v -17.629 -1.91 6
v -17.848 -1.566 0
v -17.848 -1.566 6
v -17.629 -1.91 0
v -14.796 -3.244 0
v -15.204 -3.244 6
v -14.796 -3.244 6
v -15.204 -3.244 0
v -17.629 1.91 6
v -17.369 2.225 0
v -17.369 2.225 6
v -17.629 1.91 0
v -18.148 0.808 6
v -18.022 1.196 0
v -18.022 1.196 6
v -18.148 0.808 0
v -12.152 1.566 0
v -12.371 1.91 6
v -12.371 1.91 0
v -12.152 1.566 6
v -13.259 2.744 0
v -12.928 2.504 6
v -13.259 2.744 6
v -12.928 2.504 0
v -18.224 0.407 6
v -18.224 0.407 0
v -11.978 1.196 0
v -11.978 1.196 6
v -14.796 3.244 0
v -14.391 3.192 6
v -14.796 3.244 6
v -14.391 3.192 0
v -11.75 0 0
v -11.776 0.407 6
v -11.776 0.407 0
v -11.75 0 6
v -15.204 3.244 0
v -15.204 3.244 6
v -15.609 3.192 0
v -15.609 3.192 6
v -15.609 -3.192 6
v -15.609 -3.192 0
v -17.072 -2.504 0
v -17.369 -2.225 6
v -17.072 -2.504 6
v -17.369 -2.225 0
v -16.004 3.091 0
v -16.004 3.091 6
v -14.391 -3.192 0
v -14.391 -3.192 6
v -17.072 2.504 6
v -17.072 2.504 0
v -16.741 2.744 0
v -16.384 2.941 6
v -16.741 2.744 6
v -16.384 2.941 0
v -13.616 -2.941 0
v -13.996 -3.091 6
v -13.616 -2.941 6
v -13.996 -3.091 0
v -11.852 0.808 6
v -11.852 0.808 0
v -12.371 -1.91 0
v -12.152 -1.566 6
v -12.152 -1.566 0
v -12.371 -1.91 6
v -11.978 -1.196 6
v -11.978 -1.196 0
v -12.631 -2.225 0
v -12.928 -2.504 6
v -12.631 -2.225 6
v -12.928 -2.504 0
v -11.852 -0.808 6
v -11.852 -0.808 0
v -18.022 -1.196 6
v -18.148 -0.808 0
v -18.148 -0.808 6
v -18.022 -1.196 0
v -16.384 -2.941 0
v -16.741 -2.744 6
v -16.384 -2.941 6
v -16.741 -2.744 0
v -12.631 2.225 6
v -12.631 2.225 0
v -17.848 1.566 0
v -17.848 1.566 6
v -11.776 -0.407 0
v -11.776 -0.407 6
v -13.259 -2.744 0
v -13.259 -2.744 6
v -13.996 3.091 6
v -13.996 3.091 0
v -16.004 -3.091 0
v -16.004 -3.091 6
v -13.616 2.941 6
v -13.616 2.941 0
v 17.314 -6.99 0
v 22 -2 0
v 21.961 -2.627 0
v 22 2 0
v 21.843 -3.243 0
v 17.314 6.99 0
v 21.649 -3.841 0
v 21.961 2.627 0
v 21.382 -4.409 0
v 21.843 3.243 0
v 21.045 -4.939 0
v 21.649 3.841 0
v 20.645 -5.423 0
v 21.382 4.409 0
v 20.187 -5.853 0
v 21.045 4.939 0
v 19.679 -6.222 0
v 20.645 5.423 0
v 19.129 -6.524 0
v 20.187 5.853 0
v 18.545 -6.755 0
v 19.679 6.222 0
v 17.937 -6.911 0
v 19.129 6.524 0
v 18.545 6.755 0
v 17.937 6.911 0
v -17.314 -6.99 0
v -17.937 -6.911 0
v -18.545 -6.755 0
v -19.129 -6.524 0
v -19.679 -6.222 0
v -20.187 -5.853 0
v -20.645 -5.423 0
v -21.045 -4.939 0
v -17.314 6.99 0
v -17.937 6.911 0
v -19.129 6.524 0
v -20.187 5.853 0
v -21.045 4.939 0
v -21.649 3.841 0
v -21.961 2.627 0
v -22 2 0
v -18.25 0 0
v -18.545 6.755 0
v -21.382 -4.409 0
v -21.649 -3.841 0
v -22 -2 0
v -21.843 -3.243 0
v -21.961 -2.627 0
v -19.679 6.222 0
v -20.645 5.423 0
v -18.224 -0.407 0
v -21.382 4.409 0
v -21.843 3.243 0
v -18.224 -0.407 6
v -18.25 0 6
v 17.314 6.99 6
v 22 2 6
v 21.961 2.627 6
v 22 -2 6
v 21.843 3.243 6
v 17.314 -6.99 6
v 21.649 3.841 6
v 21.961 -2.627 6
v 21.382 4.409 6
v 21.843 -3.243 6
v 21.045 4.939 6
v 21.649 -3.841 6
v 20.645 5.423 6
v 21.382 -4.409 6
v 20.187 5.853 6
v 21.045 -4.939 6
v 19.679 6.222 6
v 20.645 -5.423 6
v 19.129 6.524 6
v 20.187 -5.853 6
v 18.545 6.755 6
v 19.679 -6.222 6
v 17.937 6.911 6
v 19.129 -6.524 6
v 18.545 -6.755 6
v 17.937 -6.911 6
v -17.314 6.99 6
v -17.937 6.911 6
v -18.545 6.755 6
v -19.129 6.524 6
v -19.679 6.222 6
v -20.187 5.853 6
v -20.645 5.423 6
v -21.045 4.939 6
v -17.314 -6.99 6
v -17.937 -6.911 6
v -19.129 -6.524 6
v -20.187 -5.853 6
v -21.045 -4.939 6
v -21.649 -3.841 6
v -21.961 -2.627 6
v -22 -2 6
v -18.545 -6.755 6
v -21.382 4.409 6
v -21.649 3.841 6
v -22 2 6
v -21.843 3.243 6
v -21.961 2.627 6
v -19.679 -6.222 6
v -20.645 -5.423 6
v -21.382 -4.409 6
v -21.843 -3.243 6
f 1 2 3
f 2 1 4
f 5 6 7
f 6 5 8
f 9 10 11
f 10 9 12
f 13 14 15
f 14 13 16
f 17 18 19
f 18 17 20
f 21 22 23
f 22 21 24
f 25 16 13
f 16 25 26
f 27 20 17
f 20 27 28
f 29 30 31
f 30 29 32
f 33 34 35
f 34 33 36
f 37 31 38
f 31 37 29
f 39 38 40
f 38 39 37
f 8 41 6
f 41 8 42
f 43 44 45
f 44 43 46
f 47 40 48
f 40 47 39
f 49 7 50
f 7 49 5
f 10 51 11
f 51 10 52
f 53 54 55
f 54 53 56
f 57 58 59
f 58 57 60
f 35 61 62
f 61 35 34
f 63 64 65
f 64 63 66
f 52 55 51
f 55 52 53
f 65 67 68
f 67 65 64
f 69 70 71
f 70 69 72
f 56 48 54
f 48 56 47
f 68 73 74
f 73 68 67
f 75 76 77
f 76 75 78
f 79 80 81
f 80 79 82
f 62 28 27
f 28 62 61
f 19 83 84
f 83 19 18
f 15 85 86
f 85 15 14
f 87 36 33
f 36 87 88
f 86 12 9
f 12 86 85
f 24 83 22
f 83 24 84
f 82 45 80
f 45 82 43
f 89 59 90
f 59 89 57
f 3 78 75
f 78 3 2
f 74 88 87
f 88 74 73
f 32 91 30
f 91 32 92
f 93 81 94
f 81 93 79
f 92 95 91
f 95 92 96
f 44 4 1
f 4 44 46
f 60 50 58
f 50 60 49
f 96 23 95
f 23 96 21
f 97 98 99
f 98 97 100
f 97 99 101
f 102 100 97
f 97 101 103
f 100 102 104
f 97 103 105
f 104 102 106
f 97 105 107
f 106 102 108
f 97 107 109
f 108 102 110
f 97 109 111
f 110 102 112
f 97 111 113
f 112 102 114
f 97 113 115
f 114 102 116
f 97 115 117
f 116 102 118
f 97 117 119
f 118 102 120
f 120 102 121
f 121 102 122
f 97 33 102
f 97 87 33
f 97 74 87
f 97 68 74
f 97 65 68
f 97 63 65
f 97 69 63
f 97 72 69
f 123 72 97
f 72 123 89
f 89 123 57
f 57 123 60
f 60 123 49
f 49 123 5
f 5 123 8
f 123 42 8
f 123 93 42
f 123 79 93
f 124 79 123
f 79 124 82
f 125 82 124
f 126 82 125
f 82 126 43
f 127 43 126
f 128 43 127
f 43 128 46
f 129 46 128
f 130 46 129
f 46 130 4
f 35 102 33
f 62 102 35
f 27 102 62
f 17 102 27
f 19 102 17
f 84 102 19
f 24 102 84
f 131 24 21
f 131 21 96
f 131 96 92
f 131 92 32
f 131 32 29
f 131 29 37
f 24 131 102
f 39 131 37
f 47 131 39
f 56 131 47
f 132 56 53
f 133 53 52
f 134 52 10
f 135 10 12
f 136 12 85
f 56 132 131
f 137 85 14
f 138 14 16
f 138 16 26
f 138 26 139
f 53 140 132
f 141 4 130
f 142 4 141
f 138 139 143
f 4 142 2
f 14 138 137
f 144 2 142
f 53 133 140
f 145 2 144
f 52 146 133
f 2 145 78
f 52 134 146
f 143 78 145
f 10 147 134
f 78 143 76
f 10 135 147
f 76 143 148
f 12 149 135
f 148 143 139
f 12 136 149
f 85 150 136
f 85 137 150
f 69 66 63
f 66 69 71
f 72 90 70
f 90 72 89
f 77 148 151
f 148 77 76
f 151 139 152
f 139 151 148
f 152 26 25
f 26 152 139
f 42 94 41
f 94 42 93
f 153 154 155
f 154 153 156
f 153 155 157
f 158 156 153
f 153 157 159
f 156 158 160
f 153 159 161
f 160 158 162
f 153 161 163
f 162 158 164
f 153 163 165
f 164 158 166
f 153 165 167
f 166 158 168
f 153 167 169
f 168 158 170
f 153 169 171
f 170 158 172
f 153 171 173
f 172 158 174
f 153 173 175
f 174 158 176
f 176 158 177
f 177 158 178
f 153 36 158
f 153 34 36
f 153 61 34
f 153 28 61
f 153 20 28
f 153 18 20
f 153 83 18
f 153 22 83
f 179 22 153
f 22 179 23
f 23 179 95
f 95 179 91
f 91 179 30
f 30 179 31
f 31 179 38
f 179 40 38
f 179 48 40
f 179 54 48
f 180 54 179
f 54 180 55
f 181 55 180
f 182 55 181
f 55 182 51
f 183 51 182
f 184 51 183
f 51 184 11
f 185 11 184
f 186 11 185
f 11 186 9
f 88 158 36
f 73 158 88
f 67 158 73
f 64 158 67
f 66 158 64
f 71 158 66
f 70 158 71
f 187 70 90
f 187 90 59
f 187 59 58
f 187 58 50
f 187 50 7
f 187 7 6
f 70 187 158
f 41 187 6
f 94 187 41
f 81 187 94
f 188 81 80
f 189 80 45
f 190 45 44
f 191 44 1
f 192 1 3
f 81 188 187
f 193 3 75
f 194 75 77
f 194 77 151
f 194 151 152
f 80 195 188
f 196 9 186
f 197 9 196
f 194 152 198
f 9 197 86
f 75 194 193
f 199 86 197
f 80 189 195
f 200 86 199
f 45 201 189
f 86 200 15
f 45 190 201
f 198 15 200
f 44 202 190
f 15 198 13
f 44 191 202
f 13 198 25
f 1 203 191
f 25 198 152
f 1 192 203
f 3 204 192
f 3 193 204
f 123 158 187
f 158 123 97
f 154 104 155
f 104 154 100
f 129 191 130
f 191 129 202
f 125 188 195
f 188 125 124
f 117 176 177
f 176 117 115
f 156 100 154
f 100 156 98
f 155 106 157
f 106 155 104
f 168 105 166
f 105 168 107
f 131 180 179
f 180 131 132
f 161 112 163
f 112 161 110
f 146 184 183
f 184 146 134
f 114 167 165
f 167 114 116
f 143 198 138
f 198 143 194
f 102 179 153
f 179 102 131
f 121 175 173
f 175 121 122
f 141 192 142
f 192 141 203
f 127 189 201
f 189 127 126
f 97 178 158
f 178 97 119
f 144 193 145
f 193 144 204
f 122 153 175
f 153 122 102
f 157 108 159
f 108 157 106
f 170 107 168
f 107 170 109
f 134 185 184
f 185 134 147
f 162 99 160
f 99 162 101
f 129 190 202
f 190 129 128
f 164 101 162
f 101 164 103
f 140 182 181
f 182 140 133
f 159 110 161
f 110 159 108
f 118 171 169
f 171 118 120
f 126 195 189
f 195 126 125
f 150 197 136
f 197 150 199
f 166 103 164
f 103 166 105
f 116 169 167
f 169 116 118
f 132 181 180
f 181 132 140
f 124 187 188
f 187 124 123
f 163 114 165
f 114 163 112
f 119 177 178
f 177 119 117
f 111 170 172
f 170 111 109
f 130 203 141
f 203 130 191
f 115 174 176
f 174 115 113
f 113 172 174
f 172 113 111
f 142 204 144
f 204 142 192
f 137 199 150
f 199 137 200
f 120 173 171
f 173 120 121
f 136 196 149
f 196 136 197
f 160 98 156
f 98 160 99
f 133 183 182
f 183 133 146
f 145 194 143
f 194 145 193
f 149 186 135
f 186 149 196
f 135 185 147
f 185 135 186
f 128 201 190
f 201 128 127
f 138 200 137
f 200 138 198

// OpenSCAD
$fn = 50;


difference() {
	union() {
		hull() {
			translate(v = [-17.0000000000, 2.0000000000, 0]) {
				cylinder(h = 6, r = 5);
			}
			translate(v = [17.0000000000, 2.0000000000, 0]) {
				cylinder(h = 6, r = 5);
			}
			translate(v = [-17.0000000000, -2.0000000000, 0]) {
				cylinder(h = 6, r = 5);
			}
			translate(v = [17.0000000000, -2.0000000000, 0]) {
				cylinder(h = 6, r = 5);
			}
		}
	}
	union() {
		translate(v = [-15.0000000000, 0.0000000000, 0]) {
			cylinder(h = 6, r = 3.2500000000);
		}
		translate(v = [-15.0000000000, 0.0000000000, 0]) {
			cylinder(h = 6, r = 1.8000000000);
		}
		translate(v = [-15.0000000000, 0.0000000000, 0]) {
			cylinder(h = 6, r = 1.8000000000);
		}
		translate(v = [-15.0000000000, 0.0000000000, 0]) {
			cylinder(h = 6, r = 1.8000000000);
		}
	}
}
